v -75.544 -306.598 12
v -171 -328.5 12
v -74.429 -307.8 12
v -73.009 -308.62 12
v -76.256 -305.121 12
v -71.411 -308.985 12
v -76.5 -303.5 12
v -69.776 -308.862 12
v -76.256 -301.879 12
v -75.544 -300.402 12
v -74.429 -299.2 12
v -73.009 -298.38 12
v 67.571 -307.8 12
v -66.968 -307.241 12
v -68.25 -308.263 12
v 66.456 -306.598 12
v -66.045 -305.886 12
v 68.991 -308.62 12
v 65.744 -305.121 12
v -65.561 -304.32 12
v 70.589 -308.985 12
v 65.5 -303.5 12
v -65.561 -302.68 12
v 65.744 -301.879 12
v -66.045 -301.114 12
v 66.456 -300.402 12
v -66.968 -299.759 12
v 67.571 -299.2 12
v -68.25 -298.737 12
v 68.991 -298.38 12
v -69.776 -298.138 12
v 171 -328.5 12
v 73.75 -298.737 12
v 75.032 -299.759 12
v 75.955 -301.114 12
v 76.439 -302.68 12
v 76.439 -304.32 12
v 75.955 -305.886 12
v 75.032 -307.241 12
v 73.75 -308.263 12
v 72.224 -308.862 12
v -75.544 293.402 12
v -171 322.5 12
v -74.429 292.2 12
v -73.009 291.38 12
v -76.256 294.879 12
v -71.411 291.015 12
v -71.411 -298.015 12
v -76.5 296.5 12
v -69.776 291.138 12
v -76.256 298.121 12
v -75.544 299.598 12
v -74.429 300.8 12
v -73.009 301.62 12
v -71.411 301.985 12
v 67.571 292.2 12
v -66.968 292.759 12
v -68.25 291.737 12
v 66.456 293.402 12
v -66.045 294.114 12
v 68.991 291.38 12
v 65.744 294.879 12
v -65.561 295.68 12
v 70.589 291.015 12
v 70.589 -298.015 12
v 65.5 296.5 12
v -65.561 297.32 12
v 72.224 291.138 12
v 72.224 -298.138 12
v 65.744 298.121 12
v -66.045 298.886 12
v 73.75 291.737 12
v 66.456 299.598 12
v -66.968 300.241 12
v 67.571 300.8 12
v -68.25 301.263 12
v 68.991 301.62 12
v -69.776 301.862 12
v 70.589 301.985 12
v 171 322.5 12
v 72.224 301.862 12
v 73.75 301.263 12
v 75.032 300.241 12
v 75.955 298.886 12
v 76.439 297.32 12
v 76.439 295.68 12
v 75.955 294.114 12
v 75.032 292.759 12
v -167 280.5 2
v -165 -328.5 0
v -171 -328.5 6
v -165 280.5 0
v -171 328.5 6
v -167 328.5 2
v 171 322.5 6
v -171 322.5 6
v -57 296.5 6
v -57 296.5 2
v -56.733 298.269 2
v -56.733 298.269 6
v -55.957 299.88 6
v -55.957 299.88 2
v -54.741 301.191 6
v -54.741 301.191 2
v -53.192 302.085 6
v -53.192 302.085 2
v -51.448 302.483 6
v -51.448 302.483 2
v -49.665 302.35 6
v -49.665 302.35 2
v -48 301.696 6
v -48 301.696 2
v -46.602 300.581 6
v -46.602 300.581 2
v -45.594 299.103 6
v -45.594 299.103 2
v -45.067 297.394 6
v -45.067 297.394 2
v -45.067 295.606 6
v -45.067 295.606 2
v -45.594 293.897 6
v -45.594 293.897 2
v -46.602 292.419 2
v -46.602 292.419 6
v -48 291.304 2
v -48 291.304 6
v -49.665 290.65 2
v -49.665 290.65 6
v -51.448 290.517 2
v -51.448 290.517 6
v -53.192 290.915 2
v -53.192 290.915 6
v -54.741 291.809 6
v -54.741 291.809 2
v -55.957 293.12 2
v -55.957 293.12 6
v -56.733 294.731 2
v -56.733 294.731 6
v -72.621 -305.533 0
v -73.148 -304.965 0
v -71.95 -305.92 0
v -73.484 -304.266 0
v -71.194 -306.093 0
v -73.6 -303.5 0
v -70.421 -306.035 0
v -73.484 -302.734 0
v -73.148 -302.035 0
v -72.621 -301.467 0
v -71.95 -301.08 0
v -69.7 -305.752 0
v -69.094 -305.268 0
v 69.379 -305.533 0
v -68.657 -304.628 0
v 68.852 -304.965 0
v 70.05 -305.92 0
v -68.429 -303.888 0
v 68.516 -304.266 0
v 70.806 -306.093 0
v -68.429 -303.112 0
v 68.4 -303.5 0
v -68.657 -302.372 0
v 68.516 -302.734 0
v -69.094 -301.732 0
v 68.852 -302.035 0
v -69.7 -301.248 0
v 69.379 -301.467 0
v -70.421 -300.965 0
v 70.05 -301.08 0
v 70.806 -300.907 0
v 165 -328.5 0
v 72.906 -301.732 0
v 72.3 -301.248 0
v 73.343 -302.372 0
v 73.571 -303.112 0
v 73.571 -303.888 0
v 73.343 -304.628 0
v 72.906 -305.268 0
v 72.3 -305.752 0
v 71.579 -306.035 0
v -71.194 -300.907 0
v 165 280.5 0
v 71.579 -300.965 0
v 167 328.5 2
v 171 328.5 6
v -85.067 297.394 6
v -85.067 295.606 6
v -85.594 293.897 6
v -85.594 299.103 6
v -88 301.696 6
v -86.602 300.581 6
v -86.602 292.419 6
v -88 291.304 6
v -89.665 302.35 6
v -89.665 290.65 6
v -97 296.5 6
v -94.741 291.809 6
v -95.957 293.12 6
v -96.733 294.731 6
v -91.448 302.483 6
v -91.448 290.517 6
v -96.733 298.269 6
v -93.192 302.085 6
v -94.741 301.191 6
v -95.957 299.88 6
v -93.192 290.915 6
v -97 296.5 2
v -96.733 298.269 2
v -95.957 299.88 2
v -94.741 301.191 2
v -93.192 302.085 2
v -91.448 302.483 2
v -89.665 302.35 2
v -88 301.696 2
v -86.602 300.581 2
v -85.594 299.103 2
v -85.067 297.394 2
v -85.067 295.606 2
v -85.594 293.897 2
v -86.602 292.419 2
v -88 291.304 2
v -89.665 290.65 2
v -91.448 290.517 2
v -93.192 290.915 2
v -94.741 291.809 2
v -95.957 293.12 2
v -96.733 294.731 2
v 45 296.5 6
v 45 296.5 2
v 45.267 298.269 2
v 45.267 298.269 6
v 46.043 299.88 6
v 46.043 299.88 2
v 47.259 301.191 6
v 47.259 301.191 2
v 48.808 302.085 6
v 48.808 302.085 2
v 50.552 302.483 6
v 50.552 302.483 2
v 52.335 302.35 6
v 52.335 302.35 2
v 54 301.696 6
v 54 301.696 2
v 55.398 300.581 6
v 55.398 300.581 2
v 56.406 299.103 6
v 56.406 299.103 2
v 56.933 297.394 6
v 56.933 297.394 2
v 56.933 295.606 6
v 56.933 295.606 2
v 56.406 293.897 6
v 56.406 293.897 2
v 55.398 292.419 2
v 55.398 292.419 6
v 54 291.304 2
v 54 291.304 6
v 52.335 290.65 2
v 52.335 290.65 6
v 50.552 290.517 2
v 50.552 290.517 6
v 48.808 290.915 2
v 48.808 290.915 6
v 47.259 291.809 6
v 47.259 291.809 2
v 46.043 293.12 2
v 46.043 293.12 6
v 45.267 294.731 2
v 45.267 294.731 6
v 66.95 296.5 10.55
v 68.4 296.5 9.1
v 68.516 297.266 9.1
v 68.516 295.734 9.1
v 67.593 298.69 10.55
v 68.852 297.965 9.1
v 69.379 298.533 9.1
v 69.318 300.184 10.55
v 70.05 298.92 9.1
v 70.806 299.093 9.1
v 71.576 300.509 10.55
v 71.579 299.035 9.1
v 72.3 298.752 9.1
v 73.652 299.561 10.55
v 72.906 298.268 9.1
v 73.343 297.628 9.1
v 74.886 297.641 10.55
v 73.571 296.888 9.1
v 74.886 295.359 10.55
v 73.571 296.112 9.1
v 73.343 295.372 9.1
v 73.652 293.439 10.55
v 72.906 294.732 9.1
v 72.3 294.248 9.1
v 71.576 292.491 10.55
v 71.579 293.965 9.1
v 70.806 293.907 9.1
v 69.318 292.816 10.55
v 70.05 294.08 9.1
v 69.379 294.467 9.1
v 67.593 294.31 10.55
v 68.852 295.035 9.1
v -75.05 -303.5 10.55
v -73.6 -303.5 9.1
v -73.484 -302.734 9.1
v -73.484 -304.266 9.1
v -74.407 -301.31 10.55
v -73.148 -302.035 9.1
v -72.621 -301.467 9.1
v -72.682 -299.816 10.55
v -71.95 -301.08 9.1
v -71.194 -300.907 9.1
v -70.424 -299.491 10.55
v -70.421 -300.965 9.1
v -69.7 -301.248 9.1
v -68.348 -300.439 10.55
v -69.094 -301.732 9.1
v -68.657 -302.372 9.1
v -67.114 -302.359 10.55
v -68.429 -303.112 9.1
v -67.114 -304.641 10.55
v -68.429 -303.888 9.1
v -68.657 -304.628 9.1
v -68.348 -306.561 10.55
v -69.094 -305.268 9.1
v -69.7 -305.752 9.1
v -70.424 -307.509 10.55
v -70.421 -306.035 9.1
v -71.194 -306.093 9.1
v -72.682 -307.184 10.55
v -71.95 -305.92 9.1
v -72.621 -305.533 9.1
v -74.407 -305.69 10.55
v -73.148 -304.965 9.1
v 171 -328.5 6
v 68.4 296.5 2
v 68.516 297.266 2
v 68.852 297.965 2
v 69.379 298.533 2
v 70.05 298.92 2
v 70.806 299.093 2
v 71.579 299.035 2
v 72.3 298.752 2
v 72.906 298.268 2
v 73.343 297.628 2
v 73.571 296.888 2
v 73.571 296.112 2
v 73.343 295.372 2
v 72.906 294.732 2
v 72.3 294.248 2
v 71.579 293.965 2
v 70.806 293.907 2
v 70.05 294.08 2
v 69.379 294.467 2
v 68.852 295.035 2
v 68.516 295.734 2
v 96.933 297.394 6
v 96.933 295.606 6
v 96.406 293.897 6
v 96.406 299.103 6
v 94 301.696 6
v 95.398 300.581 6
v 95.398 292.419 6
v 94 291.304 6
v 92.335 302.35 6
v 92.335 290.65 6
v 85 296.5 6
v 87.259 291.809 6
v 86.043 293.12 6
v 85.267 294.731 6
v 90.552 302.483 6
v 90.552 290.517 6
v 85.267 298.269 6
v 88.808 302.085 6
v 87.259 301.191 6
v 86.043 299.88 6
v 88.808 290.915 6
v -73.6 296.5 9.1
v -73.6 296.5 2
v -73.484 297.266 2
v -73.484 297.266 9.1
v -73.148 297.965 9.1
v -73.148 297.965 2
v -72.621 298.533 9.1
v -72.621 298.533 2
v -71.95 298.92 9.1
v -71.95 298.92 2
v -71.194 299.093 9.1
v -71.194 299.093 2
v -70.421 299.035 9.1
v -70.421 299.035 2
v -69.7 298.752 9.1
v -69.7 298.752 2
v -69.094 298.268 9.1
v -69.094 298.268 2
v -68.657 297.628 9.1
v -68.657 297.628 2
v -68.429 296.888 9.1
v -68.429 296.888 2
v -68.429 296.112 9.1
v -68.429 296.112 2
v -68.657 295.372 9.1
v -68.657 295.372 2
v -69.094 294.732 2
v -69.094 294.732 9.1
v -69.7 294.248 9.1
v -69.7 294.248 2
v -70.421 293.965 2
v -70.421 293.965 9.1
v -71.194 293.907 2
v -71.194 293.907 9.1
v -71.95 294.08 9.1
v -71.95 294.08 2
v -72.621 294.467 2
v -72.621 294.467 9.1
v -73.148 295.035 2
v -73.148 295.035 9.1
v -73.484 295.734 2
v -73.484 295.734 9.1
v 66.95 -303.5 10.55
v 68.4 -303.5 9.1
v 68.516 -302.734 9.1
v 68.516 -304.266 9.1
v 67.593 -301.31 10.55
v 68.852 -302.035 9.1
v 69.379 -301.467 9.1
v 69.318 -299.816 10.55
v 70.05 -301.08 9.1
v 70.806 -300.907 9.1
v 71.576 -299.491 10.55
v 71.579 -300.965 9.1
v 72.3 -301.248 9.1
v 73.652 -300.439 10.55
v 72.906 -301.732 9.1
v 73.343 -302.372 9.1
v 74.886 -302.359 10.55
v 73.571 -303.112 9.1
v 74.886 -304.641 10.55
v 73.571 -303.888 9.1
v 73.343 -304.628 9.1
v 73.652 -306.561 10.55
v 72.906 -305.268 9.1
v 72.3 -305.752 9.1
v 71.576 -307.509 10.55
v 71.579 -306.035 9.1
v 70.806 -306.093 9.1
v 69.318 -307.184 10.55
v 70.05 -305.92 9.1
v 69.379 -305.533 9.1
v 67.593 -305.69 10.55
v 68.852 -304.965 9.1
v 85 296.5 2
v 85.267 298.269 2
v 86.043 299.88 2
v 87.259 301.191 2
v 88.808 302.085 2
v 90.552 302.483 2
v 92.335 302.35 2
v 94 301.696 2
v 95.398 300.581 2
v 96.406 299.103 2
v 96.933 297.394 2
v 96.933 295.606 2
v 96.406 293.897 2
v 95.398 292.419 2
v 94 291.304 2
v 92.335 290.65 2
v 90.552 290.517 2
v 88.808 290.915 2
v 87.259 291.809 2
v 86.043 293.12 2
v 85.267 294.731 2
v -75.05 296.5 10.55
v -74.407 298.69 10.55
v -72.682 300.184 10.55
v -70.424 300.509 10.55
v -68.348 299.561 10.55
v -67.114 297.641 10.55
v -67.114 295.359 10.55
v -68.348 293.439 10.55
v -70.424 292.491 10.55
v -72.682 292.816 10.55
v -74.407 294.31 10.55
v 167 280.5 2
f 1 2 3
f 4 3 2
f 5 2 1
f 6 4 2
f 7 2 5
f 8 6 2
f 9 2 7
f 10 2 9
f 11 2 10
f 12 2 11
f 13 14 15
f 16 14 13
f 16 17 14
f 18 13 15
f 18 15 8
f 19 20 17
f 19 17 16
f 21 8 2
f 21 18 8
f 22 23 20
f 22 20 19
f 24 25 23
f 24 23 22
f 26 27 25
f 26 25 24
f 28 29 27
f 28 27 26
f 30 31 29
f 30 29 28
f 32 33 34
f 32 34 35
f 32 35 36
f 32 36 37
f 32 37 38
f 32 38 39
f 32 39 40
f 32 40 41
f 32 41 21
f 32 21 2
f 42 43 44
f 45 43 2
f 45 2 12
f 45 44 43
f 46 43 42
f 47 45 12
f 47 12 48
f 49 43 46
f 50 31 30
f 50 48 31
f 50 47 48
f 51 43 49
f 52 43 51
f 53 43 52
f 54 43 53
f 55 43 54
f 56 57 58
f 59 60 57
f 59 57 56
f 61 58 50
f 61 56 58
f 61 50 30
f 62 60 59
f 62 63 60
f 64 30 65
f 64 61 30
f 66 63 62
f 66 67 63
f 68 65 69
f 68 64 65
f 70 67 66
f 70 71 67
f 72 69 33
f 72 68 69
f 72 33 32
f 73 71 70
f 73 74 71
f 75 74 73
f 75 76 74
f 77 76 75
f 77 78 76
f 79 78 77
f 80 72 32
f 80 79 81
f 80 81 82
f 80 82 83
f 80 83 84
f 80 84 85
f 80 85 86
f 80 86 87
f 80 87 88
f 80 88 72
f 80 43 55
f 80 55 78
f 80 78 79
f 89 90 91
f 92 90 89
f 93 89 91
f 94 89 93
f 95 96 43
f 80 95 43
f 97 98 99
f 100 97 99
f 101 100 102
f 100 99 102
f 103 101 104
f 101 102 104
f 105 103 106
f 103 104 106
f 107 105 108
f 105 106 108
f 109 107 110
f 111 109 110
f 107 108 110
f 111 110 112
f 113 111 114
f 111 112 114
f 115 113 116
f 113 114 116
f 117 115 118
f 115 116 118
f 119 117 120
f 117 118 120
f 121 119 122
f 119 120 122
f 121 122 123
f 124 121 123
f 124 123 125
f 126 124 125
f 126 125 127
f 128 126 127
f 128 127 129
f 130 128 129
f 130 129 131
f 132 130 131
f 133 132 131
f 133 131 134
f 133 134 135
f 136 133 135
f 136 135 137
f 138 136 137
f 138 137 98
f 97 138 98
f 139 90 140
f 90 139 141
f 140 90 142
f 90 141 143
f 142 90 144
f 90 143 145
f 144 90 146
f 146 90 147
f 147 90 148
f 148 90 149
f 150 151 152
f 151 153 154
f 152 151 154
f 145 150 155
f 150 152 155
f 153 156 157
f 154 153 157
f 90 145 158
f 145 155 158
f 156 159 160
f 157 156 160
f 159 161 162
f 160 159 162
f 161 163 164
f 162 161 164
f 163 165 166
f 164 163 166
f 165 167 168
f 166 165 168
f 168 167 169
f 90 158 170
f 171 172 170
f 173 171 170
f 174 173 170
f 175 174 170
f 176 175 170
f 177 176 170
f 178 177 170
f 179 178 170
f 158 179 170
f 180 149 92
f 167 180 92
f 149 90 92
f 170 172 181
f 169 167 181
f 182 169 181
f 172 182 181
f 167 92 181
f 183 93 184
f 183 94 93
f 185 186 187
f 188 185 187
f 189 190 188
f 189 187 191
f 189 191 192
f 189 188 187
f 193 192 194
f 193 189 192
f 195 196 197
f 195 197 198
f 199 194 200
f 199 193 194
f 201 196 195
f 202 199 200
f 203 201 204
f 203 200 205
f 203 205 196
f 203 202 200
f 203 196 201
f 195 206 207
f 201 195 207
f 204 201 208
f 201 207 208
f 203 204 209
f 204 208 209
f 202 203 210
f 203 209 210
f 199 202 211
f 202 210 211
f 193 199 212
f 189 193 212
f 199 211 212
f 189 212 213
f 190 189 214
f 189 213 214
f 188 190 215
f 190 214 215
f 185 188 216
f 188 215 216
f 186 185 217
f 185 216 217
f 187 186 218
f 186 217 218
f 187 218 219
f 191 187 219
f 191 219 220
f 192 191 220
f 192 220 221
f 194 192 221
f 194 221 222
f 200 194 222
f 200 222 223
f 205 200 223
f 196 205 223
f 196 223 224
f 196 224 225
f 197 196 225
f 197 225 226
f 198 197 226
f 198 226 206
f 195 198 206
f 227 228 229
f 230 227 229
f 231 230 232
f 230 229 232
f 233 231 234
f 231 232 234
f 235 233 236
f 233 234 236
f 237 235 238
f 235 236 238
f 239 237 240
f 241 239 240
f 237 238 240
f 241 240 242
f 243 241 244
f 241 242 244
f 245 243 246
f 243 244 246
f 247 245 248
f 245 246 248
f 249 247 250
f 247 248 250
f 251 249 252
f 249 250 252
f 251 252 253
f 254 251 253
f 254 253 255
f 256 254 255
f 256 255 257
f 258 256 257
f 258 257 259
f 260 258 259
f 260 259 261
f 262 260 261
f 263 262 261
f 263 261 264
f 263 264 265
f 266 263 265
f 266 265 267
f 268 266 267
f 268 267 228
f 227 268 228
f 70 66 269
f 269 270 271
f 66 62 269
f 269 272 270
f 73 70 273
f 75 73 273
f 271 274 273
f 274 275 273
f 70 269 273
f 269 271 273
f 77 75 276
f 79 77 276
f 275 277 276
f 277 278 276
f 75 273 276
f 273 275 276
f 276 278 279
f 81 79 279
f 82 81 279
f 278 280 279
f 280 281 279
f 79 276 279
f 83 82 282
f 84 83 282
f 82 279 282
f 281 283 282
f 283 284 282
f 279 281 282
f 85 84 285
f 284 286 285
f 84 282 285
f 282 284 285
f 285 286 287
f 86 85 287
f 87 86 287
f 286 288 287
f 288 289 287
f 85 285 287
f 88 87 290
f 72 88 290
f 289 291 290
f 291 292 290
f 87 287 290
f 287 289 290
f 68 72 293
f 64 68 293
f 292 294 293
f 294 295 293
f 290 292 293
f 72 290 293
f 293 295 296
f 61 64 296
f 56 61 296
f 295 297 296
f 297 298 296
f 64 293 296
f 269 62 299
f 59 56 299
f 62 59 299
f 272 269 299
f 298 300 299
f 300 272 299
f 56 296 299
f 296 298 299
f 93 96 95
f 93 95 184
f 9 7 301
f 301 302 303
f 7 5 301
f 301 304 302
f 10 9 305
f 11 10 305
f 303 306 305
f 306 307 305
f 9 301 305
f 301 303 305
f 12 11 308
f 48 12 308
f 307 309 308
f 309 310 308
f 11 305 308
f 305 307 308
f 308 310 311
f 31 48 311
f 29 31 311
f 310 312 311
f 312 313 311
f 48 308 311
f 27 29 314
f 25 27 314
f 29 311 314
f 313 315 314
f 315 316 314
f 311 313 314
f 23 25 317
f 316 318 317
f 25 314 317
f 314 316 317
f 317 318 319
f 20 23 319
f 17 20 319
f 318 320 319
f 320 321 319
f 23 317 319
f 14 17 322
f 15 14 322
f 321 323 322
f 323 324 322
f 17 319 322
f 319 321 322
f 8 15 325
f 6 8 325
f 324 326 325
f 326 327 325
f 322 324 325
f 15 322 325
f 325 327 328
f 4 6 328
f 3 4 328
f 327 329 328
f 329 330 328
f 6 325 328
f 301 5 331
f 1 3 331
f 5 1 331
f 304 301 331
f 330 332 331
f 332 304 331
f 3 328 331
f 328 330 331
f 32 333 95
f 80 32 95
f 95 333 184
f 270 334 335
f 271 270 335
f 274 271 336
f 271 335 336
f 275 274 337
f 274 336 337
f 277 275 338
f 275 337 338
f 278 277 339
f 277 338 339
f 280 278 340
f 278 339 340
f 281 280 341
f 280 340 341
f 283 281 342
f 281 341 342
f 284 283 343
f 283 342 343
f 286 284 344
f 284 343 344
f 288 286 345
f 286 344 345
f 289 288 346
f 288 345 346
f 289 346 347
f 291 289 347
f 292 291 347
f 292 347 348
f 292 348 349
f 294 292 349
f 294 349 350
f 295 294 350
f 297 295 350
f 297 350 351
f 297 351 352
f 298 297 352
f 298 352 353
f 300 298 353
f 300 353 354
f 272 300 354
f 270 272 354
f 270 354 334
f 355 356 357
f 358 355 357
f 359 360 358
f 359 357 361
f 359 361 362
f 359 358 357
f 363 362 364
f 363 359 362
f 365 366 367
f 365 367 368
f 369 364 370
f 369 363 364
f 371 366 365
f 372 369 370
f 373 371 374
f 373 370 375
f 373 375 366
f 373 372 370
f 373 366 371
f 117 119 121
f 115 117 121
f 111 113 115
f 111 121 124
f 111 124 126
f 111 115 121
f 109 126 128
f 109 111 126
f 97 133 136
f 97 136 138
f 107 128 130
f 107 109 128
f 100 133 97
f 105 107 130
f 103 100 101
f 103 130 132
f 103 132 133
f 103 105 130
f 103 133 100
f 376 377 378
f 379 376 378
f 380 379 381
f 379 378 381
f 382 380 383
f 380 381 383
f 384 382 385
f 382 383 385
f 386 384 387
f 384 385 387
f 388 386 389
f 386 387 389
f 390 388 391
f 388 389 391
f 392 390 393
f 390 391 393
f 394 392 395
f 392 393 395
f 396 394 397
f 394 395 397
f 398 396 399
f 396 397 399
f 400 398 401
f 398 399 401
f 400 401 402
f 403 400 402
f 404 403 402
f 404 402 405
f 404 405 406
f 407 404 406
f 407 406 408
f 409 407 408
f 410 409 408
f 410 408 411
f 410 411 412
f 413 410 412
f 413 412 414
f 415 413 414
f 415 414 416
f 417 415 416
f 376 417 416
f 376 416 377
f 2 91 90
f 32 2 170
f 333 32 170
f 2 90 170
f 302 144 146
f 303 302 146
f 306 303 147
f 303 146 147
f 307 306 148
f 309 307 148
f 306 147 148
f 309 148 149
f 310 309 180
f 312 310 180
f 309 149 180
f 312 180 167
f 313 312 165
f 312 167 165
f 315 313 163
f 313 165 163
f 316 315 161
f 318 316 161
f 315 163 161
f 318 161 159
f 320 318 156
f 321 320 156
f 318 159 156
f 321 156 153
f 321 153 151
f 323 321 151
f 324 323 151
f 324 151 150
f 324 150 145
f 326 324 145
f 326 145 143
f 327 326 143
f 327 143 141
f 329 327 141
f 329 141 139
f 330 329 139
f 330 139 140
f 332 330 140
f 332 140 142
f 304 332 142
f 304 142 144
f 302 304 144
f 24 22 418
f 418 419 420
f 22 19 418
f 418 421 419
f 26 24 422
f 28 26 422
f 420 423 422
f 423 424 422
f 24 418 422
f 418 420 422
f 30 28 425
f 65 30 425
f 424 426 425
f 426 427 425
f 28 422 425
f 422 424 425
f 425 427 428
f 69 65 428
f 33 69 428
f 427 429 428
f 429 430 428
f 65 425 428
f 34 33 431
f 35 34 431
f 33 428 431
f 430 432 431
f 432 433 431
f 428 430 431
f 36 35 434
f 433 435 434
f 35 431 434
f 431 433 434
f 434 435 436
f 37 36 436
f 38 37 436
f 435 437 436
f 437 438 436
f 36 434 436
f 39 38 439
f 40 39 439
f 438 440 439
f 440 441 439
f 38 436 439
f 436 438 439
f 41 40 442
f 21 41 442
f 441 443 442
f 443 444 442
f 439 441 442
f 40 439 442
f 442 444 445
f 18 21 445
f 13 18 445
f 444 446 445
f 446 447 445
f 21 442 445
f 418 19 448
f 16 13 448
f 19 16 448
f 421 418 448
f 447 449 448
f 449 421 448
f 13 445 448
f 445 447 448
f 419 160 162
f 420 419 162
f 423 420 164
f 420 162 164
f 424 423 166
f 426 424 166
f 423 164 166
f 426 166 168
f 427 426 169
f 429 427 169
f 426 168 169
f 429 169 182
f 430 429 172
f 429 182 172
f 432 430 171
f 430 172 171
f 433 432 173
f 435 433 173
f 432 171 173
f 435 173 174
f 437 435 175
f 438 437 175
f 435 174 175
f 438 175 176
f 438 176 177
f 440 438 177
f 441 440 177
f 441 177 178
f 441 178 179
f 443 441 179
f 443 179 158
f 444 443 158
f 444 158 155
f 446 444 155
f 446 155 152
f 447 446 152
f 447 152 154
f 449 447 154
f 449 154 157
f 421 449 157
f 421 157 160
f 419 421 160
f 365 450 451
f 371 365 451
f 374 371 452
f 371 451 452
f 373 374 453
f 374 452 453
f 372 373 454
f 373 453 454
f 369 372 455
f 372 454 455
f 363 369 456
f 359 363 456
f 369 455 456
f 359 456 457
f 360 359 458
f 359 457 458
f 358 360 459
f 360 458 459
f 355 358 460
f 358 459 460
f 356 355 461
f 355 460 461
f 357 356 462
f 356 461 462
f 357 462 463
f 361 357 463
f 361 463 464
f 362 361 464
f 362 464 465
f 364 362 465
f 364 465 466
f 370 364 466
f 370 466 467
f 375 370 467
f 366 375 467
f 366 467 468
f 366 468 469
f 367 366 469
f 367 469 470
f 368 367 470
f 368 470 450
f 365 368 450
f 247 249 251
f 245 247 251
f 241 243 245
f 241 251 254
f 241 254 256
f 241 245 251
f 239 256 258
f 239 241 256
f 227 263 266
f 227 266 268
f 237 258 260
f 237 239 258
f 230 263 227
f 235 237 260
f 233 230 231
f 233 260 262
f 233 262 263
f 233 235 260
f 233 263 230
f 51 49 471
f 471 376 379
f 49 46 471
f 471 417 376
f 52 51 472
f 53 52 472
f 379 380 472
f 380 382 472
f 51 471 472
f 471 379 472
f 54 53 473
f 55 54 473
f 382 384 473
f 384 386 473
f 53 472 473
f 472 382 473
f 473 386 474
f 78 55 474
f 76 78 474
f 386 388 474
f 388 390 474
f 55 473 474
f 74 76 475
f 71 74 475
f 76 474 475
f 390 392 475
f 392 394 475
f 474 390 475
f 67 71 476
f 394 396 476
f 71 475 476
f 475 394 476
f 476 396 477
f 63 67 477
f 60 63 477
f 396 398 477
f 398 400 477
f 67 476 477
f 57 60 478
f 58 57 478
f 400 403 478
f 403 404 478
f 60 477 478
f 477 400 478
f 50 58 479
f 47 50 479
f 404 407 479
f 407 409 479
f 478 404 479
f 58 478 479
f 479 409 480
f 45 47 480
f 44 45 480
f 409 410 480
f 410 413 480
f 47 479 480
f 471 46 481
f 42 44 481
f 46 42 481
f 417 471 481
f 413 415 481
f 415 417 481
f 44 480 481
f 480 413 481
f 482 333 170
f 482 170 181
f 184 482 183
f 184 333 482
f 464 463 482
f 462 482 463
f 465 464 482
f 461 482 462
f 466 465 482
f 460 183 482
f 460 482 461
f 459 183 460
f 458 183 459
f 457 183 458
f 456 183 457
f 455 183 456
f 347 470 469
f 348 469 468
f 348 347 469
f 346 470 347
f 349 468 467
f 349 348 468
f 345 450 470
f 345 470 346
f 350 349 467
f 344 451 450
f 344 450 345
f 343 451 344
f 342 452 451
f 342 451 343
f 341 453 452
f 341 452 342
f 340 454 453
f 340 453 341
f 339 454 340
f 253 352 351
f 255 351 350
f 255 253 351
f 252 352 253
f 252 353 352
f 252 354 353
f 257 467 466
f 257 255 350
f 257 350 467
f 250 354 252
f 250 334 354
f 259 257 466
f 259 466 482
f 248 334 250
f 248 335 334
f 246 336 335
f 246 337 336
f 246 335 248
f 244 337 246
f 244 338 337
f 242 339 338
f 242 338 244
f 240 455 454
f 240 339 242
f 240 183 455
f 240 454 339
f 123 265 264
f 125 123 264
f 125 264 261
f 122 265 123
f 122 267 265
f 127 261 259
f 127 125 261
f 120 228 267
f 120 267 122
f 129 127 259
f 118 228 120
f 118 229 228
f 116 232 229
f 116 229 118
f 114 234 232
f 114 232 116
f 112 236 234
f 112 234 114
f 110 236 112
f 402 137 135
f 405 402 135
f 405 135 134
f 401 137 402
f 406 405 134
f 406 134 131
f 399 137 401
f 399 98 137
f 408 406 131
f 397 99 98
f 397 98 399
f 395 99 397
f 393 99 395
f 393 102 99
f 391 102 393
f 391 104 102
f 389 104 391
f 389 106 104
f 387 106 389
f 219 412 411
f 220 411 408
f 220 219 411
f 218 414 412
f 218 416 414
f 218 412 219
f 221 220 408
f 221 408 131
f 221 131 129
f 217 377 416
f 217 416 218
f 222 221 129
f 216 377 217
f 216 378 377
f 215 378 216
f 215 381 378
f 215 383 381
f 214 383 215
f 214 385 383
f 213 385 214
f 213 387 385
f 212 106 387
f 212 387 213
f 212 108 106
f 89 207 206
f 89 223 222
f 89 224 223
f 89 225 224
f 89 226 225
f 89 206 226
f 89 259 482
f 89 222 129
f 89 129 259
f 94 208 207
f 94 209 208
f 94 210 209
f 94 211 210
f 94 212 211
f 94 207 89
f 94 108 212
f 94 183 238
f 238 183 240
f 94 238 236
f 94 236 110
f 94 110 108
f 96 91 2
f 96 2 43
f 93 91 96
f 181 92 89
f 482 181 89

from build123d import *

# Parameters (mm, degrees)
SKETCH1_W           = 342
SKETCH1_H           = 657
BOSS_EXTRUDE1_DEPTH = 12
SKETCH2_W           = 6
SKETCH2_H           = 6
CUT_EXTRUDE1_DEPTH  = 475.362993919
CHAMFER1_SIZE       = 6
SKETCH3_R           = 2.6
CUT_EXTRUDE2_DEPTH  = 371.536435455
CHAMFER2_SIZE       = 2.9
SKETCH4_R           = 6
CUT_EXTRUDE3_DEPTH  = 6
SKETCH5_W           = 342
SKETCH5_H           = 48
CUT_EXTRUDE4_DEPTH  = 2


with BuildPart() as part:
    # Sketch1 → Boss-Extrude1 (new body)
    with BuildSketch(Plane.XY):
        Rectangle(SKETCH1_W, SKETCH1_H)
    extrude(amount=BOSS_EXTRUDE1_DEPTH)

    # Sketch2 → Cut-Extrude1 (cut, through all)
    with BuildSketch(Plane.ZY.offset(171)):
        with Locations((9, 325.5)):
            Rectangle(SKETCH2_W, SKETCH2_H)
    extrude(amount=-CUT_EXTRUDE1_DEPTH, mode=Mode.SUBTRACT)

    # Chamfer1
    chamfer1_edges = [part.edges().sort_by_distance(p)[0] for p in [
        (171, 0, 0),
        (-171, 0, 0),
    ]]
    chamfer(chamfer1_edges, length=CHAMFER1_SIZE - 0.0001)  # a hair under: the kernel refuses the full size

    # Sketch3 → Cut-Extrude2 (cut, through all)
    with BuildSketch(Plane(origin=(0, 0, 0), x_dir=(-1, 0, 0), z_dir=(0, 0, -1))):
        with Locations((-71, -303.5)):
            Circle(SKETCH3_R)
        with Locations((71, -303.5)):
            Circle(SKETCH3_R)
        with Locations((71, 296.5)):
            Circle(SKETCH3_R)
        with Locations((-71, 296.5)):
            Circle(SKETCH3_R)
    extrude(amount=-CUT_EXTRUDE2_DEPTH, mode=Mode.SUBTRACT)

    # Chamfer2
    chamfer2_edges = [part.edges().sort_by_distance(p)[0] for p in [
        (73.6, -303.5, 12),
        (-68.4, -303.5, 12),
        (-68.4, 296.5, 12),
        (73.6, 296.5, 12),
    ]]
    chamfer(chamfer2_edges, length=CHAMFER2_SIZE)

    # Sketch4 → Cut-Extrude3 (cut)
    with BuildSketch(Plane(origin=(0, 0, 0), x_dir=(-1, 0, 0), z_dir=(0, 0, -1))):
        with Locations((-91, 296.5)):
            Circle(SKETCH4_R)
        with Locations((-51, 296.5)):
            Circle(SKETCH4_R)
        with Locations((51, 296.5)):
            Circle(SKETCH4_R)
        with Locations((91, 296.5)):
            Circle(SKETCH4_R)
    extrude(amount=-CUT_EXTRUDE3_DEPTH, mode=Mode.SUBTRACT)

    # Sketch5 → Cut-Extrude4 (cut)
    with BuildSketch(Plane(origin=(0, 0, 0), x_dir=(-1, 0, 0), z_dir=(0, 0, -1))):
        with Locations((0, 304.5)):
            Rectangle(SKETCH5_W, SKETCH5_H)
    extrude(amount=-CUT_EXTRUDE4_DEPTH, mode=Mode.SUBTRACT)


solid = part.part
